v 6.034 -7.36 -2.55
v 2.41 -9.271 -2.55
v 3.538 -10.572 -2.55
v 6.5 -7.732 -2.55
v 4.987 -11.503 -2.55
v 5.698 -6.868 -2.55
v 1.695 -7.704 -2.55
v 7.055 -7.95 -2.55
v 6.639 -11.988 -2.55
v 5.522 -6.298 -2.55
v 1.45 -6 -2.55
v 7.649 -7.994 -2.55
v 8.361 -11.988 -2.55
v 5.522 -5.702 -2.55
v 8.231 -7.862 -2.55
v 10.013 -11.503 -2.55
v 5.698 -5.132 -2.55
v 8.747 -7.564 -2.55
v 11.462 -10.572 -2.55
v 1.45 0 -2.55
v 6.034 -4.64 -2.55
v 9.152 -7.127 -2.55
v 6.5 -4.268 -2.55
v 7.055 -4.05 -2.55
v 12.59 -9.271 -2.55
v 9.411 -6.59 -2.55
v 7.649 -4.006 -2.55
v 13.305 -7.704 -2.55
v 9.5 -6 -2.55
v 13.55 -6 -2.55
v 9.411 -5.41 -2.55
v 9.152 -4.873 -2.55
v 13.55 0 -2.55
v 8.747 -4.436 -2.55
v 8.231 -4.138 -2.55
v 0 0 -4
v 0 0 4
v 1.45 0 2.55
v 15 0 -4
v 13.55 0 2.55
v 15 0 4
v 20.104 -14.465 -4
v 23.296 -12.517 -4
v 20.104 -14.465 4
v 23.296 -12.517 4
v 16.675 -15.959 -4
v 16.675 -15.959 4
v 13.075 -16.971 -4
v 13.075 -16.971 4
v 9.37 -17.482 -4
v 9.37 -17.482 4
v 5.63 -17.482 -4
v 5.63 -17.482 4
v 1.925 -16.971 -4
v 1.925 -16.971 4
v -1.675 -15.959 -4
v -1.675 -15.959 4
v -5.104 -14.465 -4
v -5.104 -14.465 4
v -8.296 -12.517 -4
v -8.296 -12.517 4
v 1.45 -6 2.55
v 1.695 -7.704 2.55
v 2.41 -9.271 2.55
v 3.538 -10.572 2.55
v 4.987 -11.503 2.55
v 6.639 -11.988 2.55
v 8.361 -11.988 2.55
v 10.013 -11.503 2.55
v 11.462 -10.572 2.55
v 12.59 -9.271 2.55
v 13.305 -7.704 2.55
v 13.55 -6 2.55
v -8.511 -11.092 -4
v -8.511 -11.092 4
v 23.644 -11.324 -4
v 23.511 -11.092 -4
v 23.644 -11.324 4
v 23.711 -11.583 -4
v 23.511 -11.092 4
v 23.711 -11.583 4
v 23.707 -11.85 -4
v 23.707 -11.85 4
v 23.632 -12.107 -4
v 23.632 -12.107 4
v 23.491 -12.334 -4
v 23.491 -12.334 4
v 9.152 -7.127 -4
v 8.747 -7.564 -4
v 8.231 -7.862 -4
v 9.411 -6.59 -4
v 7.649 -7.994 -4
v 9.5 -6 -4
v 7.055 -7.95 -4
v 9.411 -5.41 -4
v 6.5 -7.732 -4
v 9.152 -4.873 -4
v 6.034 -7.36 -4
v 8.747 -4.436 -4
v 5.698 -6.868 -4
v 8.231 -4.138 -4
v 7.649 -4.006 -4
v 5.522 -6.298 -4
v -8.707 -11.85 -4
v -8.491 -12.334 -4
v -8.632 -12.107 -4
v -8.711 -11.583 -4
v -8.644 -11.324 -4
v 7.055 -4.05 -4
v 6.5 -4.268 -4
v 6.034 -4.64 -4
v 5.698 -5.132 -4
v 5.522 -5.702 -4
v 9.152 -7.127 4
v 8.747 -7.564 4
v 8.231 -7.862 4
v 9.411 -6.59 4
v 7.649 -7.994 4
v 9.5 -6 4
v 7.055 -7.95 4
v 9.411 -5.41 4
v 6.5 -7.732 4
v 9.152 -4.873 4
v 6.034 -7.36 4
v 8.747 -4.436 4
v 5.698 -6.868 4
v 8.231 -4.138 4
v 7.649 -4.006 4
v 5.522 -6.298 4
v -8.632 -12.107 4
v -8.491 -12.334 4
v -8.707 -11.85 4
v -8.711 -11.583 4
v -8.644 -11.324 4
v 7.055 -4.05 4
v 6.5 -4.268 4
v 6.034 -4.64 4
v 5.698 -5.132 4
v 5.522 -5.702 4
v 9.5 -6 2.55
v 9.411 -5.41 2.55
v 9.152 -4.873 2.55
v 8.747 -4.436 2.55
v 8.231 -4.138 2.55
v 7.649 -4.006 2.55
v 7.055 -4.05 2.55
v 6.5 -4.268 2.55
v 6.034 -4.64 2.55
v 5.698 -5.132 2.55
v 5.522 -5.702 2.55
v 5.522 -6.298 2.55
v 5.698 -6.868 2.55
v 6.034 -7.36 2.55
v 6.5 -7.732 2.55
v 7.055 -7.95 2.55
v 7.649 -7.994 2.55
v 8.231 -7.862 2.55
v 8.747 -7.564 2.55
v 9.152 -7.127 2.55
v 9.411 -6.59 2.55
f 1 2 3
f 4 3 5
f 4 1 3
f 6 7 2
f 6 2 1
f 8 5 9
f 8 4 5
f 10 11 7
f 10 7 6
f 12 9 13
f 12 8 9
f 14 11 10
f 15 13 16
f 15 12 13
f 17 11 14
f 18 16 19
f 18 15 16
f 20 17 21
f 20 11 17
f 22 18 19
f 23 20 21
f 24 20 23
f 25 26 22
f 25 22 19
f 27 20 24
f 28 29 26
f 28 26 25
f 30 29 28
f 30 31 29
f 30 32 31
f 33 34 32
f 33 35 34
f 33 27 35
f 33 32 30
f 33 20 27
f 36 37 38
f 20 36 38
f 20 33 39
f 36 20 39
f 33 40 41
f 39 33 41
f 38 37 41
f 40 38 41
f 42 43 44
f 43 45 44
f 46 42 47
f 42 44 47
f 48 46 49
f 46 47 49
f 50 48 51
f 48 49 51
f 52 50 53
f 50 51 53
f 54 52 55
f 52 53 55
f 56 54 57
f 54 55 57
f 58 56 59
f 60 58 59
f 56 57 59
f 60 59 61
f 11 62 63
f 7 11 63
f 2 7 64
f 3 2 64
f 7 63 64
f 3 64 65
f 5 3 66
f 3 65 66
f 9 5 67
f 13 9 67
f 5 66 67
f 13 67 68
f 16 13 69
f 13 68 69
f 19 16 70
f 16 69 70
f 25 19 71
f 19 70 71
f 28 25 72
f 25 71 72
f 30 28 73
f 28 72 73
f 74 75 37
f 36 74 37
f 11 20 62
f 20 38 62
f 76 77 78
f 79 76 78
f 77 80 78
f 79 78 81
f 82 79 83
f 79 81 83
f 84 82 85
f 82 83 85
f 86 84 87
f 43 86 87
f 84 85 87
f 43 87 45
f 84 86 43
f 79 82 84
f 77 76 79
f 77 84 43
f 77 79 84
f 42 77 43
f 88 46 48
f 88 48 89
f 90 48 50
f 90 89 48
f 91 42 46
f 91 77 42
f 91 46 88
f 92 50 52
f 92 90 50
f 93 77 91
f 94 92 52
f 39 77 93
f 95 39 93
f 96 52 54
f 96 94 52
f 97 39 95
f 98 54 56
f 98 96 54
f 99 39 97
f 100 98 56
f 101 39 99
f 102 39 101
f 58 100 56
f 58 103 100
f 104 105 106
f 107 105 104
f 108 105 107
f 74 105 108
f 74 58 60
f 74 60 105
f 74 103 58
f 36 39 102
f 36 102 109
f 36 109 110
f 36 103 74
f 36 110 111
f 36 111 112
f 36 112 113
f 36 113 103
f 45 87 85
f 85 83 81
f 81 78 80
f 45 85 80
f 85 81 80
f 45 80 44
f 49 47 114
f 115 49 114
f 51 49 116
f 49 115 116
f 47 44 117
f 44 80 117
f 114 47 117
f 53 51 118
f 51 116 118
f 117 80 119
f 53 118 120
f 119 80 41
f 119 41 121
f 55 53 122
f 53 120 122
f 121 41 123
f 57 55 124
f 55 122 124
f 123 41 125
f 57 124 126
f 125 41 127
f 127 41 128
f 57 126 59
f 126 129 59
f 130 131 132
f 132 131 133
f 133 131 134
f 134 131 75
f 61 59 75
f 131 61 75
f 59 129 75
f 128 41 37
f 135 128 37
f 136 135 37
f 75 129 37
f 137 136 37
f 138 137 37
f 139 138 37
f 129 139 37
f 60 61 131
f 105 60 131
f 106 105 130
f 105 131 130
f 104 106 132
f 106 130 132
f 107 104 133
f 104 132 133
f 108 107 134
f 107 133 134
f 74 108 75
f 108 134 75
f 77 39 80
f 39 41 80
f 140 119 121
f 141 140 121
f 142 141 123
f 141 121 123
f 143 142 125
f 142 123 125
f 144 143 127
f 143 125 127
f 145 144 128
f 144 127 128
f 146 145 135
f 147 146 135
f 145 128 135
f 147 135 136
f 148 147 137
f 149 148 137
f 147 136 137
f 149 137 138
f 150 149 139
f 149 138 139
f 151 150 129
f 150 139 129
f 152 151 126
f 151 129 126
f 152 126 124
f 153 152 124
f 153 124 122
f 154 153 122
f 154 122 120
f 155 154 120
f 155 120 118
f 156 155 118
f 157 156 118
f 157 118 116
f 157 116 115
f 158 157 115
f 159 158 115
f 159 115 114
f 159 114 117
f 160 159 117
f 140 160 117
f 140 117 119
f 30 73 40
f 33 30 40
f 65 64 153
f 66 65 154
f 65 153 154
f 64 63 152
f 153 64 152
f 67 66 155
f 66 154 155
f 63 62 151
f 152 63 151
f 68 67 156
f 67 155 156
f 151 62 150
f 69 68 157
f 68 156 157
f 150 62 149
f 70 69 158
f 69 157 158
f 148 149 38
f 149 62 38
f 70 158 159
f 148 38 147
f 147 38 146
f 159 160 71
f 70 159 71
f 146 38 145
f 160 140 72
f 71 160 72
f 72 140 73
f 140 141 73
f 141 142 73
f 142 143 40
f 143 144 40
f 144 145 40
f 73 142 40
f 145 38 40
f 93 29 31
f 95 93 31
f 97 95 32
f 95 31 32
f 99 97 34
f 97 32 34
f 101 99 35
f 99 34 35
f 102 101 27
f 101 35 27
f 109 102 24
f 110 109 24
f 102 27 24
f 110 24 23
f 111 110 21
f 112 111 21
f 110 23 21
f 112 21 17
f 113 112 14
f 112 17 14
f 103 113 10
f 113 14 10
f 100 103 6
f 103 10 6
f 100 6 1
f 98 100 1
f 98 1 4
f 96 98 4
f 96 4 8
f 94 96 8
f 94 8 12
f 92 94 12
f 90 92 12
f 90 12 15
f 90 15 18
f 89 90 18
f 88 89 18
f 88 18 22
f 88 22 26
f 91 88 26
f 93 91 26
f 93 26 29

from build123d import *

# Parameters (mm, degrees)
EXTRUDE_1_DEPTH     = 4
CUT_EXTRUDE_1_DEPTH = 2.55
SKETCH_3_R          = 2
CUT_EXTRUDE_2_DEPTH = 31.567792564


with BuildPart() as part:
    # 草图1 → 凸台-拉伸1 (new, symmetric)
    with BuildSketch(Plane.XY):
        with BuildLine():
            Line((0, 0), (15, 0))
            Line((15, 0), (23.511091256, -11.091870075))
            ThreePointArc((23.511091256, -11.091870075), (23.706523759, -11.849971903), (23.295917311, -12.516541172))
            ThreePointArc((23.295917311, -12.516541172), (7.5, -17.545906941), (-8.295917311, -12.516541172))
            ThreePointArc((-8.295917311, -12.516541172), (-8.706523759, -11.849971903), (-8.511091256, -11.091870075))
            Line((-8.511091256, -11.091870075), (0, 0))
        make_face()
    extrude(amount=EXTRUDE_1_DEPTH, both=True)

    # 草图2 → 切除-拉伸1 (cut, symmetric)
    with BuildSketch(Plane.XY):
        with BuildLine():
            Line((1.45, 0), (1.45, -6))
            ThreePointArc((1.45, -6), (7.5, -12.05), (13.55, -6))
            Line((13.55, -6), (13.55, 0))
            Line((13.55, 0), (1.45, 0))
        make_face()
    extrude(amount=CUT_EXTRUDE_1_DEPTH, both=True, mode=Mode.SUBTRACT)

    # 草图3 → 切除-拉伸2 (cut, through all)
    with BuildSketch(Plane.XY.offset(4)):
        with Locations((7.5, -6)):
            Circle(SKETCH_3_R)
    extrude(amount=-CUT_EXTRUDE_2_DEPTH, mode=Mode.SUBTRACT)


solid = part.part
